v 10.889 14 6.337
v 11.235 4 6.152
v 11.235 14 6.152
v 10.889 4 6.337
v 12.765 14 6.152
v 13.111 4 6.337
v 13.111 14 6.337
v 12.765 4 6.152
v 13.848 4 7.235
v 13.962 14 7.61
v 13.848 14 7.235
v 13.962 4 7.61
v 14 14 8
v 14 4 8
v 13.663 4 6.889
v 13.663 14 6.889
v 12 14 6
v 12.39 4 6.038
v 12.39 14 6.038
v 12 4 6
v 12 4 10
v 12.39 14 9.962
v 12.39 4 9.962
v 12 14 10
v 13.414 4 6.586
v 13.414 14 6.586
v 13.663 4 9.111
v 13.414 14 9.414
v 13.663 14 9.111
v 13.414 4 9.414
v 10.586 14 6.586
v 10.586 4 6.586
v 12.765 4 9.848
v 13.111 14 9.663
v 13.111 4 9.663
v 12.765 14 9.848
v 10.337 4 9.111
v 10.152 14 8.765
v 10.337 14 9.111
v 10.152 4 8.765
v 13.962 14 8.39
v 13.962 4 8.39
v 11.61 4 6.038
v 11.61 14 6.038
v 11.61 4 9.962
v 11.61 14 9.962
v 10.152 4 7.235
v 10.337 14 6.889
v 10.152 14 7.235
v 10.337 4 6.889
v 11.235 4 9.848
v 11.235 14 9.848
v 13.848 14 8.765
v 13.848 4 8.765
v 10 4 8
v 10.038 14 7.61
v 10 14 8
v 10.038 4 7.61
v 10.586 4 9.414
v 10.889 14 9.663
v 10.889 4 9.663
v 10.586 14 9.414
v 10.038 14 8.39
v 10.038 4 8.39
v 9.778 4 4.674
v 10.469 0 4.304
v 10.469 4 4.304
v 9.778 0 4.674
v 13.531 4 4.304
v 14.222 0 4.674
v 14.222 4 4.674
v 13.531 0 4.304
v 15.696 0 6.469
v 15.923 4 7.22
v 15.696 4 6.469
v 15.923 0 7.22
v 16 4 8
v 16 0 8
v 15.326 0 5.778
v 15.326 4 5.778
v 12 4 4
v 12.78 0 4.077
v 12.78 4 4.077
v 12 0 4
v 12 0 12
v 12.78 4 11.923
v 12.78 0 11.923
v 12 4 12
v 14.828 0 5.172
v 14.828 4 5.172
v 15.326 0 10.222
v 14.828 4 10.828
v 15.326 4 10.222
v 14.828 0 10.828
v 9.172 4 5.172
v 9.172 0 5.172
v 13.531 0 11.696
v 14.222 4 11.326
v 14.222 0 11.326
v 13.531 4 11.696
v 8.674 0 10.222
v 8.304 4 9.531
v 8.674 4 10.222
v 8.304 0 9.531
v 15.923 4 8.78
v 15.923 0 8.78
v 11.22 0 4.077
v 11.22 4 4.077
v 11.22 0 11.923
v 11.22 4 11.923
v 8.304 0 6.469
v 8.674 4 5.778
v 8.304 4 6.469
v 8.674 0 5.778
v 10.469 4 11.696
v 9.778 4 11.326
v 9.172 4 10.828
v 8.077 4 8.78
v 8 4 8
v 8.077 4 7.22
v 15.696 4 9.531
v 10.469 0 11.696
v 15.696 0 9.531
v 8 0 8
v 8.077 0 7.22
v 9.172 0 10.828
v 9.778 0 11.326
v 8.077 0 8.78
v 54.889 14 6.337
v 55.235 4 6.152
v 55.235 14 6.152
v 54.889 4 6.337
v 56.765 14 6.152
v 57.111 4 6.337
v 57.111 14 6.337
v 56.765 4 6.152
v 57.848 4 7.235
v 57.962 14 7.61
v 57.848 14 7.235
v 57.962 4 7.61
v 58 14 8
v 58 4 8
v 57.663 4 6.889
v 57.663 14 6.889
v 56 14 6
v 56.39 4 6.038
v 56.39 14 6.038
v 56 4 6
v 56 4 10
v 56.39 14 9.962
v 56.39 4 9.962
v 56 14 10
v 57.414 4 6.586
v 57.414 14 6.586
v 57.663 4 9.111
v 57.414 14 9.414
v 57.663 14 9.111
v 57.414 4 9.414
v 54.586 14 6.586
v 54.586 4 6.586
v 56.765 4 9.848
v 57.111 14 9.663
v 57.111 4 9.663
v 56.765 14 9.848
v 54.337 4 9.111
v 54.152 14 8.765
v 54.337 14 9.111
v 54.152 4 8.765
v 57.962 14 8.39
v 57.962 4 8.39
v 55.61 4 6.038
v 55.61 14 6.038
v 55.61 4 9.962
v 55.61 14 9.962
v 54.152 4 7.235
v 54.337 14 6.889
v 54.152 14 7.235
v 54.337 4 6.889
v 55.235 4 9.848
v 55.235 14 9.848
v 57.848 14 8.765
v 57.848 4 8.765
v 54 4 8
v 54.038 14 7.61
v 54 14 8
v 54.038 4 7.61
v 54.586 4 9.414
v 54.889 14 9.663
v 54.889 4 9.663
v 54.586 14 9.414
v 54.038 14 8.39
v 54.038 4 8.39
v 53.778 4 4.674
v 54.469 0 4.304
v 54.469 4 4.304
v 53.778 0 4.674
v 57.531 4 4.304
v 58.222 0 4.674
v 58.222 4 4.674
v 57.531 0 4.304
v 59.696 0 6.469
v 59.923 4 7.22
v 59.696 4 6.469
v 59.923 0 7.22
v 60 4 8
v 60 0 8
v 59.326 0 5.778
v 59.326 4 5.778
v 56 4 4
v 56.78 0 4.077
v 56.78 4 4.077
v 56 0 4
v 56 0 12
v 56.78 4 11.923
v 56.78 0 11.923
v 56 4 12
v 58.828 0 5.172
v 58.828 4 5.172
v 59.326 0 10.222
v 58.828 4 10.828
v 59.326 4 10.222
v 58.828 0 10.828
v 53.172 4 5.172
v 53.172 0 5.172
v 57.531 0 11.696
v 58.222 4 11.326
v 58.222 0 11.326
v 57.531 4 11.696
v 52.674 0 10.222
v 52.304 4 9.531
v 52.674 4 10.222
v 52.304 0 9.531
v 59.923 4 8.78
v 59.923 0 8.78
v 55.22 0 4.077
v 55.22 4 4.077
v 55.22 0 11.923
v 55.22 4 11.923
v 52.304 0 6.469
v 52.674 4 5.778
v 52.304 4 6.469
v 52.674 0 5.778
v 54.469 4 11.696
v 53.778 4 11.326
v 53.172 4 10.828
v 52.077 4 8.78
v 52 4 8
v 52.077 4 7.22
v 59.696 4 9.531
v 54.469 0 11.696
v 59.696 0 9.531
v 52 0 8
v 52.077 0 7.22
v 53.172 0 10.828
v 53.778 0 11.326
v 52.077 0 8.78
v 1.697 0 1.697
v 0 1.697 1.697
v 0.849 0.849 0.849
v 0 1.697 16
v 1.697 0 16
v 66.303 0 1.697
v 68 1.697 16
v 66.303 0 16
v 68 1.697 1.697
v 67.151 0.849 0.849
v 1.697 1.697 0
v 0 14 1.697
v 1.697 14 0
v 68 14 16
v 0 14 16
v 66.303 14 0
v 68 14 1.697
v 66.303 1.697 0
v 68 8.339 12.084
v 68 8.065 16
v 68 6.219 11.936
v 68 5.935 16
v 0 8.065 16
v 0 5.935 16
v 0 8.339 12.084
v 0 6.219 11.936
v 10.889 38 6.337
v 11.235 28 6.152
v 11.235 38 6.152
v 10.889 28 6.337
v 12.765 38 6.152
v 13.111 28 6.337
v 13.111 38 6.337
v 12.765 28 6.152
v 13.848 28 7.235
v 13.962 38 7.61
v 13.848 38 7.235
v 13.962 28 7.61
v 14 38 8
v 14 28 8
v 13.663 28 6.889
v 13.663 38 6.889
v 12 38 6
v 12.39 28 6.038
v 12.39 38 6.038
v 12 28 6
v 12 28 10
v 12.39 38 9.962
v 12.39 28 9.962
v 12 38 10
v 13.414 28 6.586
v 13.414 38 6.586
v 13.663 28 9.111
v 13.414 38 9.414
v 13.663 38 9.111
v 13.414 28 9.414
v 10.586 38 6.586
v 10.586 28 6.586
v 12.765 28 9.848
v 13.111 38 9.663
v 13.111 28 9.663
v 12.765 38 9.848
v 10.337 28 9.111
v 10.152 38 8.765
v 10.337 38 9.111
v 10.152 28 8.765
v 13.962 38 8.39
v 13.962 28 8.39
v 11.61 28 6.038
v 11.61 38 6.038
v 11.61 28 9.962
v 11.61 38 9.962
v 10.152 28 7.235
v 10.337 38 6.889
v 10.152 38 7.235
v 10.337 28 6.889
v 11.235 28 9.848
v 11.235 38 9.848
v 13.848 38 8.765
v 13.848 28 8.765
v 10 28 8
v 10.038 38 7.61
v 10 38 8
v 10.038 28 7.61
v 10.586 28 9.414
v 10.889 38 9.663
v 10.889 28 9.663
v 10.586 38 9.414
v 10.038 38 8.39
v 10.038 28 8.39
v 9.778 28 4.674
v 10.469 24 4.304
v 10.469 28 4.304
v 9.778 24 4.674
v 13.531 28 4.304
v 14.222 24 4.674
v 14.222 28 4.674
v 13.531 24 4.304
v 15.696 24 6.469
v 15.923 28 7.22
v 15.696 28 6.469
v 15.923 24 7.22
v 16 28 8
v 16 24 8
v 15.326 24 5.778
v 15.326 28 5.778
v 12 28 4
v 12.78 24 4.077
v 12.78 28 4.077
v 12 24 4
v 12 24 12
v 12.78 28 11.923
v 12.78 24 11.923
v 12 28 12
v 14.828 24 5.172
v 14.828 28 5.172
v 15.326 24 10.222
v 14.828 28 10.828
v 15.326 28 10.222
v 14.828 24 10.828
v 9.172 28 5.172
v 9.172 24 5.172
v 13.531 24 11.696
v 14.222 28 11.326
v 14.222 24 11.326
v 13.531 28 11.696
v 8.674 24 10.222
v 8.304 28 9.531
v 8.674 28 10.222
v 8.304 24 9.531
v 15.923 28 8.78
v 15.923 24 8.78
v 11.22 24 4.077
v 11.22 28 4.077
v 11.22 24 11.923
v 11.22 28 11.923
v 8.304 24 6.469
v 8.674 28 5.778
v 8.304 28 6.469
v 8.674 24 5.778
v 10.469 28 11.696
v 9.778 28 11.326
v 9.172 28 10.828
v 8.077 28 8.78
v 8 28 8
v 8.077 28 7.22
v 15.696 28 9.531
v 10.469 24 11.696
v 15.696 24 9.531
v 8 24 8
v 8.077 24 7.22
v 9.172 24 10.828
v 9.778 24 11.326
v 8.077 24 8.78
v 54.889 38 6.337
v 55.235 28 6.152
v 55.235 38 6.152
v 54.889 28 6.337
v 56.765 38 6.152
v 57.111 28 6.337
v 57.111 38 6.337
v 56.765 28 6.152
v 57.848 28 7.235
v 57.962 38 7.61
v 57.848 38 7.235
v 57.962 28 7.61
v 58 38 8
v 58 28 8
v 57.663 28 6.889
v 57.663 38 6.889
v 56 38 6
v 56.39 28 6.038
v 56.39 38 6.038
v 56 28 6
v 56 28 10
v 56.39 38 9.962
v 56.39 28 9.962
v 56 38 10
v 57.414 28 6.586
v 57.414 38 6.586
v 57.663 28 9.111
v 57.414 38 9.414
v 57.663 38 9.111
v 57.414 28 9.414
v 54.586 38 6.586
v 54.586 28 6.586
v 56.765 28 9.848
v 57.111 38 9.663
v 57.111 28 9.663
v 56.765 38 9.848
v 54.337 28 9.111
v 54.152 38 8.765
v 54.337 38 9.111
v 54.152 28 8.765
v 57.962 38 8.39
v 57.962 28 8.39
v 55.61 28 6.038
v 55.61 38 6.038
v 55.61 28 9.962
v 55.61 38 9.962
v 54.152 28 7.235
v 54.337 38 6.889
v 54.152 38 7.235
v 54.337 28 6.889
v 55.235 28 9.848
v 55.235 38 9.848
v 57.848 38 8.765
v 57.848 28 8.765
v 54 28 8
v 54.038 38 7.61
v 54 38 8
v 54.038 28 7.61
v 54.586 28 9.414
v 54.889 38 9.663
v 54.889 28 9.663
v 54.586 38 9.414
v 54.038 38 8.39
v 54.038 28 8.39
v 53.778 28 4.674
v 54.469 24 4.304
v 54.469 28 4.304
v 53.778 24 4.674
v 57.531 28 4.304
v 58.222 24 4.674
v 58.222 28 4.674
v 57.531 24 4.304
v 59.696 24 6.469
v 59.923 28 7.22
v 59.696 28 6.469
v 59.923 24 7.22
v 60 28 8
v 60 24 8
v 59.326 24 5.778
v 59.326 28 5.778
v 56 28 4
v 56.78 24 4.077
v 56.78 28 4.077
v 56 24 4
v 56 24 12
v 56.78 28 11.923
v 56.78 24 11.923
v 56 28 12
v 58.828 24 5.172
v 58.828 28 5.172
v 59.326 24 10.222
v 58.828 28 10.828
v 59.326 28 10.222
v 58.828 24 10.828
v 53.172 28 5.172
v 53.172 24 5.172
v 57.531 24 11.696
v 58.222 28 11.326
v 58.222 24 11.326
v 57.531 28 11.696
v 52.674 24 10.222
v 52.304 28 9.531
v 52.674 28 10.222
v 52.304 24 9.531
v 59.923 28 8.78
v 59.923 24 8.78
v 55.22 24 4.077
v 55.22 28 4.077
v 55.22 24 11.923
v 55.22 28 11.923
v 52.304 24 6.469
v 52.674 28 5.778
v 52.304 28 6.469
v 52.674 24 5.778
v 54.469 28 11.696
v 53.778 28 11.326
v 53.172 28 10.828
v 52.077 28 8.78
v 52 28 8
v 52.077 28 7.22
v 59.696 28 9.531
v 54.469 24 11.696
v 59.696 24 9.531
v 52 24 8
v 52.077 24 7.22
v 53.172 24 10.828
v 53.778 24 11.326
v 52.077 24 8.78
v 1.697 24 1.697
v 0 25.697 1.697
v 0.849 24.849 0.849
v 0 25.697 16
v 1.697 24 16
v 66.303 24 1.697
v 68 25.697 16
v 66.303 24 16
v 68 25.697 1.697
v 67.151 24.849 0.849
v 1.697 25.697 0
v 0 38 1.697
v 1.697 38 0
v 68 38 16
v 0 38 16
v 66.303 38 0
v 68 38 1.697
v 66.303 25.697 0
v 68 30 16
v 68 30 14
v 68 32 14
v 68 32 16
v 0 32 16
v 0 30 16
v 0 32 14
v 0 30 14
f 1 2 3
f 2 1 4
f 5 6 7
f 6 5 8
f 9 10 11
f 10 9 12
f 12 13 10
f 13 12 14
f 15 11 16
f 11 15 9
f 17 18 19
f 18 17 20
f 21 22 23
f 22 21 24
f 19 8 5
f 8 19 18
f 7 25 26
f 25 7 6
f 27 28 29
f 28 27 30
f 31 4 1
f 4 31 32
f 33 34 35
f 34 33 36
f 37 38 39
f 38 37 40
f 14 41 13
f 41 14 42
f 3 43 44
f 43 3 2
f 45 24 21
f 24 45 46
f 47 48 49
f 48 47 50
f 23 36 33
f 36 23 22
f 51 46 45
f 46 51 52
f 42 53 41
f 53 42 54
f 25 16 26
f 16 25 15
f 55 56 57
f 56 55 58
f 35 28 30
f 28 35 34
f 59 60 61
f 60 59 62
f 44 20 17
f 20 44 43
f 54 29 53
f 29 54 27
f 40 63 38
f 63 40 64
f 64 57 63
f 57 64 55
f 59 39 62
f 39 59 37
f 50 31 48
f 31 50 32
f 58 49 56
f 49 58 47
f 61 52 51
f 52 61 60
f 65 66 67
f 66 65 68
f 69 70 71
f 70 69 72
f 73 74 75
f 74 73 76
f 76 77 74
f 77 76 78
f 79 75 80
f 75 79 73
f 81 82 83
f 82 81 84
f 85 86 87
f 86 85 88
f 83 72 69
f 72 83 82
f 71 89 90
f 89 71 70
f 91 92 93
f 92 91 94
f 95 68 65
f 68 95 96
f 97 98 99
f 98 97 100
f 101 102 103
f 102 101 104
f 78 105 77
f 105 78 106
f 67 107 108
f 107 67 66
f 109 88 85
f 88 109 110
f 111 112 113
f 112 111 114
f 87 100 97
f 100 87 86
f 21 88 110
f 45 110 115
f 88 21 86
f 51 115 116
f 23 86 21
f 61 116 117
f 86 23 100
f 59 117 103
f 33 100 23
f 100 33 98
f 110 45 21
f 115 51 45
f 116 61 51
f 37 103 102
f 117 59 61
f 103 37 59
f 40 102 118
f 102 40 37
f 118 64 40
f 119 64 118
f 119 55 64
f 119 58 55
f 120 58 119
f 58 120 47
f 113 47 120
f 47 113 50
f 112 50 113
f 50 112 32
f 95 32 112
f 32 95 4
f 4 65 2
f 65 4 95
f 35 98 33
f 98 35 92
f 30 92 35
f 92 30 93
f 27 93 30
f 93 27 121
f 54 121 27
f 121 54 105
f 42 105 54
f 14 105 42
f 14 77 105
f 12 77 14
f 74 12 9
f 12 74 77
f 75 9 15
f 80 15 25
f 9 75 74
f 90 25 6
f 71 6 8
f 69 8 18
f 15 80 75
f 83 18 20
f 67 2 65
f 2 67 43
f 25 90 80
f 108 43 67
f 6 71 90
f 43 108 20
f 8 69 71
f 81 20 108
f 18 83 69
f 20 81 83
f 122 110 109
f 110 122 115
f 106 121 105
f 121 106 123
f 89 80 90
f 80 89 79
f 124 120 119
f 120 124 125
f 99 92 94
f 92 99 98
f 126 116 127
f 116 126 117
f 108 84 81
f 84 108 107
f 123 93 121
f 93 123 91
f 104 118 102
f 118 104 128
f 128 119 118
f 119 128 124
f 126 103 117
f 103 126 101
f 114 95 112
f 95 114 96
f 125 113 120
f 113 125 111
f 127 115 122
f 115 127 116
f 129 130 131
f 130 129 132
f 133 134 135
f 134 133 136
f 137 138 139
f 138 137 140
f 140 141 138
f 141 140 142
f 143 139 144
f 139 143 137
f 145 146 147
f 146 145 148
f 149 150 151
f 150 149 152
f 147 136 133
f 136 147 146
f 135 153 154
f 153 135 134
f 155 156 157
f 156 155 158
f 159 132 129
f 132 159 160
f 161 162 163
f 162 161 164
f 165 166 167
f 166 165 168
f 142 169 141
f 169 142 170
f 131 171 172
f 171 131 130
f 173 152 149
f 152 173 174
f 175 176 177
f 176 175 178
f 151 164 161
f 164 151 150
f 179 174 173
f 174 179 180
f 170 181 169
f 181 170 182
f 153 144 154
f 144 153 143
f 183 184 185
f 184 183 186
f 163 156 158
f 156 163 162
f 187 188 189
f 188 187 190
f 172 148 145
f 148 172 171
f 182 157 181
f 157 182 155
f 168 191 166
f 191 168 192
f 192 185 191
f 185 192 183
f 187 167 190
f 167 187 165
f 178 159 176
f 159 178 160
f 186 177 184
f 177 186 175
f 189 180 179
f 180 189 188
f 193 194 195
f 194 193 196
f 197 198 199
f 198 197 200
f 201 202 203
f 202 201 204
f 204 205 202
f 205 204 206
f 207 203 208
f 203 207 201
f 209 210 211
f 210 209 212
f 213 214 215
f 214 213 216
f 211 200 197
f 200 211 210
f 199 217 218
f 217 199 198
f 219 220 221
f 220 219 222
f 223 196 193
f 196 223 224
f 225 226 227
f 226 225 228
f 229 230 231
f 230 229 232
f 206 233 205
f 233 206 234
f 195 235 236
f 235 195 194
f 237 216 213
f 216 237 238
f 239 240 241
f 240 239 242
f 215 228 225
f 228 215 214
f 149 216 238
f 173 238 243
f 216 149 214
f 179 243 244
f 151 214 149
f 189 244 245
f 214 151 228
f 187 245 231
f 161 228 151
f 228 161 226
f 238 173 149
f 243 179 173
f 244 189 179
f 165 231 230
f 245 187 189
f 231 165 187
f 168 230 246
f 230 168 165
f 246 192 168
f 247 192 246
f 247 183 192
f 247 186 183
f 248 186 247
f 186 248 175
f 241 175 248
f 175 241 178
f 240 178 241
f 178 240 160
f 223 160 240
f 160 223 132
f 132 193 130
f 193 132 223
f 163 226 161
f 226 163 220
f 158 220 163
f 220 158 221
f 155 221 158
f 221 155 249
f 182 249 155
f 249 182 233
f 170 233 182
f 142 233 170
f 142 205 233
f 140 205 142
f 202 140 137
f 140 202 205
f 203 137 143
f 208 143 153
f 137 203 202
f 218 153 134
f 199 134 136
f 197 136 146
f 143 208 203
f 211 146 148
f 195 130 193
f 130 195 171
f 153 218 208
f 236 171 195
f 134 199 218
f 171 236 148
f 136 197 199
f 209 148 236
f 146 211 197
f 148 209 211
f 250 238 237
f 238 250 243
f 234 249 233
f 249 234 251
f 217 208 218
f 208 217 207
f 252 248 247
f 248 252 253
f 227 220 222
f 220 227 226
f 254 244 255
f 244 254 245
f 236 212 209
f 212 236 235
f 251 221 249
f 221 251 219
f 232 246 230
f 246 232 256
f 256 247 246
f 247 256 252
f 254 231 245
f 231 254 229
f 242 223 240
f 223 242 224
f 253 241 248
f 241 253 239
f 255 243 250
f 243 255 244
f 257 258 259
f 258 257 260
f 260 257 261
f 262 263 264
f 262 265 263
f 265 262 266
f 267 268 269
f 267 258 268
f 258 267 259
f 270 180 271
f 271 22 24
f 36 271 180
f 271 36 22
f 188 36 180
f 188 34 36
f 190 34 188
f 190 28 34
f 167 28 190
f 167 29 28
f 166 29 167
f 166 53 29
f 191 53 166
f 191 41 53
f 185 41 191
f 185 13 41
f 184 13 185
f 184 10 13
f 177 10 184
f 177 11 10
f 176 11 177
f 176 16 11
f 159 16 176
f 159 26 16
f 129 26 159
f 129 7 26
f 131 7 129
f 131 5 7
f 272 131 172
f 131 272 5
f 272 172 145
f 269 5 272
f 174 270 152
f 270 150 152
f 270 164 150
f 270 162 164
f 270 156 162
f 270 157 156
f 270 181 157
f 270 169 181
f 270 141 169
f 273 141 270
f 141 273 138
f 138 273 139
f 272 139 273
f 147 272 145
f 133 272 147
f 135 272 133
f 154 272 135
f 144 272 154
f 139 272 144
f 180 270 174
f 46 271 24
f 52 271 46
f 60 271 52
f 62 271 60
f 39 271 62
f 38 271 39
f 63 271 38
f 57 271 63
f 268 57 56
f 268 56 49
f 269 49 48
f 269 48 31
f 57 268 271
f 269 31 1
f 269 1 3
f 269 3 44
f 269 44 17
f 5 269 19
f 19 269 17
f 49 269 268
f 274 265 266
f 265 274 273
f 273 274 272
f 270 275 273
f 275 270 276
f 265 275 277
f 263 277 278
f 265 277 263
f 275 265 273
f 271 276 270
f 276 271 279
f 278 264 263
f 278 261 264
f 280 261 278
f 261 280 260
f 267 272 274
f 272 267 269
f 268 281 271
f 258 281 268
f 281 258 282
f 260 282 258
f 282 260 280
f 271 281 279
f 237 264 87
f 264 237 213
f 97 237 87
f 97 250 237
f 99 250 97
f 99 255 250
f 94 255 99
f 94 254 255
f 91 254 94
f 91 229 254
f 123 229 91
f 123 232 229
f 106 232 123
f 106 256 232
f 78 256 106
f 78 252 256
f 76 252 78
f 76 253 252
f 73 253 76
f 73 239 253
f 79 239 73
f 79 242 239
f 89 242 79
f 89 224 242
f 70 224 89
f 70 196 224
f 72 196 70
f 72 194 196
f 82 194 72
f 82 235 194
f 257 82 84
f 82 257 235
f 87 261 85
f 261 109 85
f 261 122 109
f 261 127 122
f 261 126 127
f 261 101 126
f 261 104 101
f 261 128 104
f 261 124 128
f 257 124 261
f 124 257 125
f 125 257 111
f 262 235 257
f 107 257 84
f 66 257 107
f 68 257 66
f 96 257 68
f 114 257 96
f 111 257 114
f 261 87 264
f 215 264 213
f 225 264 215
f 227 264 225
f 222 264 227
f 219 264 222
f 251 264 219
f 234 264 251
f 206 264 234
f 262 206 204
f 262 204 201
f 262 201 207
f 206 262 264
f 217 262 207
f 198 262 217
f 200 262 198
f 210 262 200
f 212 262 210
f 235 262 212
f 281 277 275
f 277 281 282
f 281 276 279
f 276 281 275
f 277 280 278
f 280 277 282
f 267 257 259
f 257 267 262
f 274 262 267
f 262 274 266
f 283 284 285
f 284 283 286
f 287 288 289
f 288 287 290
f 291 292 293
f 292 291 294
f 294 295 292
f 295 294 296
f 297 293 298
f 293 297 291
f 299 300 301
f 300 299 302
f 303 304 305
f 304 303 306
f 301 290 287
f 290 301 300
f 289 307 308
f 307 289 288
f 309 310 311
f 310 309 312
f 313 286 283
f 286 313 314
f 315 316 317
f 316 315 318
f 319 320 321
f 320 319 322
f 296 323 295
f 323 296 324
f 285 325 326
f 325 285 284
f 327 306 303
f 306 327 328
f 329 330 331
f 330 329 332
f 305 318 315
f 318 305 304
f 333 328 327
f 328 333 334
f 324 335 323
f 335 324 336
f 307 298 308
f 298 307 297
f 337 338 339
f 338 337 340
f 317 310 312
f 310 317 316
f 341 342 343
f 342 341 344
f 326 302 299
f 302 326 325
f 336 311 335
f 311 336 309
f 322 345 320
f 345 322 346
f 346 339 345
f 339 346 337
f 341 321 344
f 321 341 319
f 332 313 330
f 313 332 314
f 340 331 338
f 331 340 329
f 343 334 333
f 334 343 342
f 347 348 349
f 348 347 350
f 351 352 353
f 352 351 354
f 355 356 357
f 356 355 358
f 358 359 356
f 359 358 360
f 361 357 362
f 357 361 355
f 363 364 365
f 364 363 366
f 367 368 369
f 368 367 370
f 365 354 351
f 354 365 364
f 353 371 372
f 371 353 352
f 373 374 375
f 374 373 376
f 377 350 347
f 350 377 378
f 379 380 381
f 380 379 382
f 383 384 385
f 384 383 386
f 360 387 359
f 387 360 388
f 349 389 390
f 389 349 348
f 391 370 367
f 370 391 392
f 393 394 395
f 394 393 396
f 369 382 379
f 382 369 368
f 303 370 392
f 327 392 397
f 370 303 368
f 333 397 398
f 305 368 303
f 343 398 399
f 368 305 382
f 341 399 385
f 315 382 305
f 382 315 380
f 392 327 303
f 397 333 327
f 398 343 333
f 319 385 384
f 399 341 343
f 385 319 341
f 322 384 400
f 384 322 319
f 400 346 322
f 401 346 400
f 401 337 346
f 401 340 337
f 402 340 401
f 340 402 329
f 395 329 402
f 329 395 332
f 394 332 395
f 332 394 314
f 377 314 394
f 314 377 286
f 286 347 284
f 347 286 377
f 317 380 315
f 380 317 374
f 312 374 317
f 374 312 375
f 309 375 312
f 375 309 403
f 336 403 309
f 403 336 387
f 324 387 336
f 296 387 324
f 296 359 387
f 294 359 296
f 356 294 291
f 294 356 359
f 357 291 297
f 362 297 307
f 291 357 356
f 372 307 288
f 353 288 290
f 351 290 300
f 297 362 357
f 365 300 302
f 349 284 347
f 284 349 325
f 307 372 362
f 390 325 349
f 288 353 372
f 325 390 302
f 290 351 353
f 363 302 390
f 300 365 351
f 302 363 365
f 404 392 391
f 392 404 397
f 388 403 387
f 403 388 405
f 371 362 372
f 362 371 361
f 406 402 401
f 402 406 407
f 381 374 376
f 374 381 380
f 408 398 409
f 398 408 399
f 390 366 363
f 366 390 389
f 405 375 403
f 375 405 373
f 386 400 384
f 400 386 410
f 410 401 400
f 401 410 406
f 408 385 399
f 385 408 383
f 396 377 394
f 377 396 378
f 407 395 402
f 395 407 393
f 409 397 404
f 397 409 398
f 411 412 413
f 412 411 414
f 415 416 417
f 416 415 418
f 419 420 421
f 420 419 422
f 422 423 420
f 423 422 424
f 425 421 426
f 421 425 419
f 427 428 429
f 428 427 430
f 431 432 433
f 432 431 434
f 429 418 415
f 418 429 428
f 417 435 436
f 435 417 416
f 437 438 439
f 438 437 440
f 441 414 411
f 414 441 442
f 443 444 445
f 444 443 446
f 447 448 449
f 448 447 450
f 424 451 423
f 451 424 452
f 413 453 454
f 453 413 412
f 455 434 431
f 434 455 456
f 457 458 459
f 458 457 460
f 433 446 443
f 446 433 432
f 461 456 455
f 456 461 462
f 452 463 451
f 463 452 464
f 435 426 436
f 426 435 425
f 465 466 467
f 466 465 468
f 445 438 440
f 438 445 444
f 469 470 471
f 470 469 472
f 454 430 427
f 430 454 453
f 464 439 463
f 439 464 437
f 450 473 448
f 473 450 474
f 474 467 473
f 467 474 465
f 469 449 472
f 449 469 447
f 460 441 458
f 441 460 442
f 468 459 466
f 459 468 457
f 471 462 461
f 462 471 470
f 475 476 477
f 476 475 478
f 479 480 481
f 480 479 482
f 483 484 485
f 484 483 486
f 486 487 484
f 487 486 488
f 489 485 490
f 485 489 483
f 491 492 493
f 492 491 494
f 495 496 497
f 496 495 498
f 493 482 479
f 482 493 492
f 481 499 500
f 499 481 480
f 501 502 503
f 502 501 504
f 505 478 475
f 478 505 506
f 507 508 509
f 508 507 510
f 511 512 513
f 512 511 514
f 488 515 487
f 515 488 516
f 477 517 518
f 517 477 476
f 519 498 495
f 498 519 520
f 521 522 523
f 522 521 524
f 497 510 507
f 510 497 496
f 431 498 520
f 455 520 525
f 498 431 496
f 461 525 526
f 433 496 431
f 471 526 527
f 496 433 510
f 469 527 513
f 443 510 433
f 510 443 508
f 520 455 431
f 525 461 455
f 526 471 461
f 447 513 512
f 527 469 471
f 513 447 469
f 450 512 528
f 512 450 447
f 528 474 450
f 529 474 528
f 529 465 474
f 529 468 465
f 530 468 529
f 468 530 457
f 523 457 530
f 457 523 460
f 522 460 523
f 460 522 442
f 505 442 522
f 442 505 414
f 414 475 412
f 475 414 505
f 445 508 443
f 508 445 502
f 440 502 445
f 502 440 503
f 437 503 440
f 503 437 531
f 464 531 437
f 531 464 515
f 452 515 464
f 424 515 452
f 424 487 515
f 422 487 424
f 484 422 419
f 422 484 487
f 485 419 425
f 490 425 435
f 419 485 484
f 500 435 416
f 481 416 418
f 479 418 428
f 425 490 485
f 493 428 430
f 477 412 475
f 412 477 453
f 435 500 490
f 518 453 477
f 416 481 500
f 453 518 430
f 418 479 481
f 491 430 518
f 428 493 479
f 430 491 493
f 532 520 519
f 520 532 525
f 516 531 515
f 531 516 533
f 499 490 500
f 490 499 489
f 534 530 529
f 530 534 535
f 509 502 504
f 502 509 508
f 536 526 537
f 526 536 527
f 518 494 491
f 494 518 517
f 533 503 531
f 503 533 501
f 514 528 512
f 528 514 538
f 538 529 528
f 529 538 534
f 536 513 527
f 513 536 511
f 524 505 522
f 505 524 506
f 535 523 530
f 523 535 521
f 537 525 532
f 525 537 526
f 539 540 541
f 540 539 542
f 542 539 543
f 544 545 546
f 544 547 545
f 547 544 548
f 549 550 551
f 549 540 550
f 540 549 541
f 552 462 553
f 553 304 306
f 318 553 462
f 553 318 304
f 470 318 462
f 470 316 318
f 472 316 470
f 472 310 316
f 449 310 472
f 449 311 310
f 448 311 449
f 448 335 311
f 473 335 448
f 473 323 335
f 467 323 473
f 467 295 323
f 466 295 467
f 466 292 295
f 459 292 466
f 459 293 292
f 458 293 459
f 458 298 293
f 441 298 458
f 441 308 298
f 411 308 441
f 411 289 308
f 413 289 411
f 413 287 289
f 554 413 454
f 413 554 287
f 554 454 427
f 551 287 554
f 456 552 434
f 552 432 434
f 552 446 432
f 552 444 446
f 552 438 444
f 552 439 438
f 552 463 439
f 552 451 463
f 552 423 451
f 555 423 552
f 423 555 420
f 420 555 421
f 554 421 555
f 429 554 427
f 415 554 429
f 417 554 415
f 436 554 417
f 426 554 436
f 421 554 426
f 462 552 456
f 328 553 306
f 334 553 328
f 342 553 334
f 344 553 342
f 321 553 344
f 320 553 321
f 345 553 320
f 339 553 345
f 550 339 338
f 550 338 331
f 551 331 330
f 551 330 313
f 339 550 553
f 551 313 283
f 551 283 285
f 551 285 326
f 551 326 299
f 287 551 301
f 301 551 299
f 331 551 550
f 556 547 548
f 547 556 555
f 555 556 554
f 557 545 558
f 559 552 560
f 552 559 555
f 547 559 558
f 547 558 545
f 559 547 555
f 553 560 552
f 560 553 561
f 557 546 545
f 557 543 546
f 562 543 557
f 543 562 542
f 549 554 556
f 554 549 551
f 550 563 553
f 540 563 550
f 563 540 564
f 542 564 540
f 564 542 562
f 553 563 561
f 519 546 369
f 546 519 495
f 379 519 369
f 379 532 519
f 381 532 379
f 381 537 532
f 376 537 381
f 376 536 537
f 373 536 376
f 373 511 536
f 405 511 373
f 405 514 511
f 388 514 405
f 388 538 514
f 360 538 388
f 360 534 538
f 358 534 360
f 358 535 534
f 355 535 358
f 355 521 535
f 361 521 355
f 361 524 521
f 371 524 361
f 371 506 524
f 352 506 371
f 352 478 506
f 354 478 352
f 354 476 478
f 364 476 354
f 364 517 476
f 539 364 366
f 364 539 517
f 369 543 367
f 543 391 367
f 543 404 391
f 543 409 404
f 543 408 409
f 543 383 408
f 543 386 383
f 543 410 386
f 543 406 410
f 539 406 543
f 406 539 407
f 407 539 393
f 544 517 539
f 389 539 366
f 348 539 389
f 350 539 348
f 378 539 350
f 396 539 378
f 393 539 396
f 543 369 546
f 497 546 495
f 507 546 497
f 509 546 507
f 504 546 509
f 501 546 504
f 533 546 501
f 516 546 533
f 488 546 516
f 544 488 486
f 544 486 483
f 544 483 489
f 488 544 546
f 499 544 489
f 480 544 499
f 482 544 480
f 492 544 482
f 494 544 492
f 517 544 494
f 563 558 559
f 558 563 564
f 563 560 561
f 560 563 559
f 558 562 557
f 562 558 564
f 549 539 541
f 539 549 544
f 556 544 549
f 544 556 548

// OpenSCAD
// Project: Wall Plate Mounting System (Clean Angled Cut)
// Version: 0.21

/* [Global Dimensions] */
width = 68;
height = 16;
depth = 14;

/* [Plate Constraints] */
plate_thickness = 1.8;

/* [Cutout Depths & Angles] */
top_depth = 4;      
bottom_depth = 2;   
top_slot_angle = 4; 

/* [Calculated Cutout Thicknesses] */
// Width for tilted plate: W = t*cos(theta) + d*sin(theta) + clearance
top_cutout_thickness = (plate_thickness * cos(top_slot_angle)) + (top_depth * sin(top_slot_angle)) + 0.05;
bottom_cutout_thickness = 2.0; 

/* [Screw Holes] */
screw_dia = 4;
head_dia = 8;
head_sink = 4;
screw_offset = 12;

/* [Finishing] */
chamfer_size = 1.2;

module mounting_block(cutout_d, cutout_w, slot_angle=0) {
    difference() {
        // Base Block
        cube([width, depth, height]);

        // Cutout (Always on the top face: z = height)
        // We use a taller cube for the subtraction to ensure it clears the top when angled
        translate([-1, depth / 2, height])
            rotate([slot_angle, 0, 0])
            translate([0, -cutout_w / 2, -cutout_d])
                cube([width + 2, cutout_w, cutout_d + 5]); // Height buffer added here

        // Screw Holes
        for(x = [screw_offset, width - screw_offset]) {
            translate([x, -1, height / 2])
                rotate([-90, 0, 0]) {
                    cylinder(d = screw_dia, h = depth + 2, $fn = 32);
                    cylinder(d = head_dia, h = head_sink + 1, $fn = 32);
                }
        }

        // --- CHAMFERS ---
        // 1. Vertical Front Corners
        for(x = [0, width]) {
            translate([x, 0, -1])
                rotate([0, 0, 45 + (x == width ? 90 : 0)])
                    translate([-chamfer_size, -chamfer_size, 0])
                        cube([chamfer_size * 2, chamfer_size * 2, height + 2]);
        }
        
        // 2. Horizontal Outer Edge (Bottom-front)
        translate([-1, 0, 0])
            rotate([45, 0, 0])
                translate([0, -chamfer_size, -chamfer_size])
                    cube([width + 2, chamfer_size * 2, chamfer_size * 2]);
        
        // 3. Side Horizontal Edges (Bottom-sides)
        for(x = [0, width]) {
            translate([x, -1, 0])
                rotate([0, -45 - (x == width ? 90 : 0), 0])
                    translate([-chamfer_size, 0, -chamfer_size])
                        cube([chamfer_size * 2, depth + 1, chamfer_size * 2]);
        }
    }
}

// Block 1: TOP position (Mount upside down on wall)
mounting_block(cutout_d = top_depth, cutout_w = top_cutout_thickness, slot_angle = top_slot_angle);

// Block 2: BOTTOM position
translate([0, depth + 10, 0]) 
    mounting_block(cutout_d = bottom_depth, cutout_w = bottom_cutout_thickness, slot_angle = 0);
